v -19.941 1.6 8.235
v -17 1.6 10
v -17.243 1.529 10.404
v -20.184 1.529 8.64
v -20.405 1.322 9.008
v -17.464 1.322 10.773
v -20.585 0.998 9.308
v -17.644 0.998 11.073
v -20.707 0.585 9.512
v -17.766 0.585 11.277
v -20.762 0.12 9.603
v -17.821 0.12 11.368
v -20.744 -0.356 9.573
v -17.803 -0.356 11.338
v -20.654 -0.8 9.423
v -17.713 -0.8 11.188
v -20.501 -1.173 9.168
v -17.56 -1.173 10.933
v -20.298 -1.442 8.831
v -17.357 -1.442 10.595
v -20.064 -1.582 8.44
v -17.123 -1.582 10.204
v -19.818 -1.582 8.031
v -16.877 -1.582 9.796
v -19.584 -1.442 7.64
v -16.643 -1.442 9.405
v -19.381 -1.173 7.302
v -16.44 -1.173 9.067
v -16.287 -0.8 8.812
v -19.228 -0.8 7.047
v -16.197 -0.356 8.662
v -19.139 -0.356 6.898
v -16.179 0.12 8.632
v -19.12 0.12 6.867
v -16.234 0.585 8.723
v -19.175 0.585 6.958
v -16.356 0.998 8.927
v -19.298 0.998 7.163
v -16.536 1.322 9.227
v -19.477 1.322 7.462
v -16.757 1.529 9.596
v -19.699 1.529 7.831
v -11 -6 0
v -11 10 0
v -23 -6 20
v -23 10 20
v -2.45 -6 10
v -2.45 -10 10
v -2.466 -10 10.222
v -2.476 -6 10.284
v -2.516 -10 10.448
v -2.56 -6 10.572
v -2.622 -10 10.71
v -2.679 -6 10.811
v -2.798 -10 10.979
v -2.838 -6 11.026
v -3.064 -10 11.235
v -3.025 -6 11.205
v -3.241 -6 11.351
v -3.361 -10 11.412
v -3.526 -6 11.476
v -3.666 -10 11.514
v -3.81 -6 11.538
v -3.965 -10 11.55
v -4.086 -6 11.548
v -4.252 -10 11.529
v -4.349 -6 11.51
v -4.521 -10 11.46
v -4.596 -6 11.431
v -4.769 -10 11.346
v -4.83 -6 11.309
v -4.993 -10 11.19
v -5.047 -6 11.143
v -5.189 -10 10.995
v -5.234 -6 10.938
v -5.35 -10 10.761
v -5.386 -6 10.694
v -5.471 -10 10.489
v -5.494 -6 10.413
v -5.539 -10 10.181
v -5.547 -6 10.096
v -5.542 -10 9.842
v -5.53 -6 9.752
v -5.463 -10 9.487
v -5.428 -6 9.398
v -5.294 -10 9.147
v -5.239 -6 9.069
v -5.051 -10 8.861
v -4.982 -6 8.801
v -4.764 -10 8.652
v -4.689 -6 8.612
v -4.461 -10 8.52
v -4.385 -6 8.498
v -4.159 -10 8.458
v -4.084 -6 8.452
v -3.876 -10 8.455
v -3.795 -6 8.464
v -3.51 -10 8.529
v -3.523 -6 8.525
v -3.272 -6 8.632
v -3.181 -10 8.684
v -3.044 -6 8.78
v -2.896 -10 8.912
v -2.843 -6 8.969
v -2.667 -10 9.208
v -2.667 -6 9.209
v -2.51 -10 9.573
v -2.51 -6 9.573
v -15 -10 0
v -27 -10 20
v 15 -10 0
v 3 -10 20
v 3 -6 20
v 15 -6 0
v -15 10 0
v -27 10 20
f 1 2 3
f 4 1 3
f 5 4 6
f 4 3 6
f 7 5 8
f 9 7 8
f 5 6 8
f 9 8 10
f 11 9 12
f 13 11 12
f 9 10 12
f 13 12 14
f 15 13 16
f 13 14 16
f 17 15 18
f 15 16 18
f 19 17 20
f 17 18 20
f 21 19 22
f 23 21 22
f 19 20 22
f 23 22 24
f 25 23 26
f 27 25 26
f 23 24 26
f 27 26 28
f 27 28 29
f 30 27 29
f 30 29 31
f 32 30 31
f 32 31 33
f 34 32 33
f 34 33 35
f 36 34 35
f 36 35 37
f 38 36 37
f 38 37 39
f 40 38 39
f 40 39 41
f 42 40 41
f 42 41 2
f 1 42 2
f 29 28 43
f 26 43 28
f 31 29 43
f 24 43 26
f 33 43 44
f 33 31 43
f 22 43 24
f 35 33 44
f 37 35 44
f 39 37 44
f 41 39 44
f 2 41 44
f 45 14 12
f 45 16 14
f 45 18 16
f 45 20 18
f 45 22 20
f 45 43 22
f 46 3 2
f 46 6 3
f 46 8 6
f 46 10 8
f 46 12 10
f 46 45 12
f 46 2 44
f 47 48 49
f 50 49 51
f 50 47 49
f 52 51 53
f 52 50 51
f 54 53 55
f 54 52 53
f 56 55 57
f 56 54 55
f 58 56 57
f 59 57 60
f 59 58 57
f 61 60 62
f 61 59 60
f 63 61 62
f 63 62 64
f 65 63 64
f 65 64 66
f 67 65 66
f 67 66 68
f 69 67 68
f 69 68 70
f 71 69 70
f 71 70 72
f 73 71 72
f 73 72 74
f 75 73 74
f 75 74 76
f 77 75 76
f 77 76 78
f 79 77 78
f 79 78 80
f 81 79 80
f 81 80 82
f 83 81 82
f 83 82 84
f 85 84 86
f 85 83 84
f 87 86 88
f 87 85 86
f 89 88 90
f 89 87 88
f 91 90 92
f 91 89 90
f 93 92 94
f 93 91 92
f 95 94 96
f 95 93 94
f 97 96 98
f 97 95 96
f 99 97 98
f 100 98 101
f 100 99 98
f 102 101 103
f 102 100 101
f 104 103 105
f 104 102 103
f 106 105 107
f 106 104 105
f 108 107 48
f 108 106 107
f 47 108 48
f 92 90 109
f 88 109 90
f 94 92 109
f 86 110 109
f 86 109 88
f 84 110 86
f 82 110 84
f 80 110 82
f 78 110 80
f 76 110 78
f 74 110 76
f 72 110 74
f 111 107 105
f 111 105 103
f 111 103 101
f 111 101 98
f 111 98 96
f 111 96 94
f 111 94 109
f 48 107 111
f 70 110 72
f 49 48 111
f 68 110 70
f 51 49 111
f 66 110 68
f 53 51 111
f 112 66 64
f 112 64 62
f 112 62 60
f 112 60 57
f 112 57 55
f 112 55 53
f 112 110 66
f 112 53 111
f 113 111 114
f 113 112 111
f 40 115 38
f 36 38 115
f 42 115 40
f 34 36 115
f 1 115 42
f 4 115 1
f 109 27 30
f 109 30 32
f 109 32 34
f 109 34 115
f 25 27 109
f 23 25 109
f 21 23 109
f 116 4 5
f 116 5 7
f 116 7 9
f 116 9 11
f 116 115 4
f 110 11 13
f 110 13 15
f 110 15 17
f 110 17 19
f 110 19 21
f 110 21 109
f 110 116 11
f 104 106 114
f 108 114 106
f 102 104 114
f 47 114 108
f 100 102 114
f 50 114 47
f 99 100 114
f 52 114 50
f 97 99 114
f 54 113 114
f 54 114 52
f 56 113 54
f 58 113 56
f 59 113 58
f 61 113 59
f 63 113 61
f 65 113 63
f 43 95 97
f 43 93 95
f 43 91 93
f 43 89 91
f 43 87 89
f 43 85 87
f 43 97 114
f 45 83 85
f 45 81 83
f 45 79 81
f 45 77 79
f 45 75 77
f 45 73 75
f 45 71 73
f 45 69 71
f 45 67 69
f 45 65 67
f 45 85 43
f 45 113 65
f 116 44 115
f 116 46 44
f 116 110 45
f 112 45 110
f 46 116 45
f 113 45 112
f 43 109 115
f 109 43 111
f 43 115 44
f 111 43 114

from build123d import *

# Parameters (mm, degrees)
SKETCH171_R          = 1.55
POCKET093_DEPTH      = 10.0010001
POCKET093_DEPTH_BACK = 10.0010001
SKETCH183_R          = 1.6
POCKET099_DEPTH      = 5


with BuildPart() as part:
    # Sketch169 → AdditiveLoft006 section 0
    with BuildSketch(Plane.XY):
        Polygon((-15, -10), (15, -10), (15, -6), (-11, -6), (-11, 10), (-15, 10), align=None)
    # Sketch170 → AdditiveLoft006 section 1
    with BuildSketch(Plane(origin=(-12, 0, 20), x_dir=(1, 0, 0), z_dir=(0, 0, 1))):
        Polygon((-15, -10), (15, -10), (15, -6), (-11, -6), (-11, 10), (-15, 10), align=None)
    loft()

    # Sketch171 → Pocket093 (cut, two sides)
    with BuildSketch(Plane.XZ) as pocket093_sk:
        with Locations((-4, 10)):
            Circle(SKETCH171_R)
    extrude(amount=-POCKET093_DEPTH, mode=Mode.SUBTRACT)
    extrude(pocket093_sk.sketch, amount=POCKET093_DEPTH_BACK, mode=Mode.SUBTRACT)

    # Sketch183 (on Face5 of Pocket093) → Pocket099 (cut)
    with BuildSketch(Plane(origin=(-8.0882352941, 0, -4.8529411765), x_dir=(0, 1, 0), z_dir=(0.8574929257, 0, 0.5144957554))):
        with Locations((0, 17.3213533097)):
            Circle(SKETCH183_R)
    extrude(amount=-POCKET099_DEPTH, mode=Mode.SUBTRACT)


solid = part.part
